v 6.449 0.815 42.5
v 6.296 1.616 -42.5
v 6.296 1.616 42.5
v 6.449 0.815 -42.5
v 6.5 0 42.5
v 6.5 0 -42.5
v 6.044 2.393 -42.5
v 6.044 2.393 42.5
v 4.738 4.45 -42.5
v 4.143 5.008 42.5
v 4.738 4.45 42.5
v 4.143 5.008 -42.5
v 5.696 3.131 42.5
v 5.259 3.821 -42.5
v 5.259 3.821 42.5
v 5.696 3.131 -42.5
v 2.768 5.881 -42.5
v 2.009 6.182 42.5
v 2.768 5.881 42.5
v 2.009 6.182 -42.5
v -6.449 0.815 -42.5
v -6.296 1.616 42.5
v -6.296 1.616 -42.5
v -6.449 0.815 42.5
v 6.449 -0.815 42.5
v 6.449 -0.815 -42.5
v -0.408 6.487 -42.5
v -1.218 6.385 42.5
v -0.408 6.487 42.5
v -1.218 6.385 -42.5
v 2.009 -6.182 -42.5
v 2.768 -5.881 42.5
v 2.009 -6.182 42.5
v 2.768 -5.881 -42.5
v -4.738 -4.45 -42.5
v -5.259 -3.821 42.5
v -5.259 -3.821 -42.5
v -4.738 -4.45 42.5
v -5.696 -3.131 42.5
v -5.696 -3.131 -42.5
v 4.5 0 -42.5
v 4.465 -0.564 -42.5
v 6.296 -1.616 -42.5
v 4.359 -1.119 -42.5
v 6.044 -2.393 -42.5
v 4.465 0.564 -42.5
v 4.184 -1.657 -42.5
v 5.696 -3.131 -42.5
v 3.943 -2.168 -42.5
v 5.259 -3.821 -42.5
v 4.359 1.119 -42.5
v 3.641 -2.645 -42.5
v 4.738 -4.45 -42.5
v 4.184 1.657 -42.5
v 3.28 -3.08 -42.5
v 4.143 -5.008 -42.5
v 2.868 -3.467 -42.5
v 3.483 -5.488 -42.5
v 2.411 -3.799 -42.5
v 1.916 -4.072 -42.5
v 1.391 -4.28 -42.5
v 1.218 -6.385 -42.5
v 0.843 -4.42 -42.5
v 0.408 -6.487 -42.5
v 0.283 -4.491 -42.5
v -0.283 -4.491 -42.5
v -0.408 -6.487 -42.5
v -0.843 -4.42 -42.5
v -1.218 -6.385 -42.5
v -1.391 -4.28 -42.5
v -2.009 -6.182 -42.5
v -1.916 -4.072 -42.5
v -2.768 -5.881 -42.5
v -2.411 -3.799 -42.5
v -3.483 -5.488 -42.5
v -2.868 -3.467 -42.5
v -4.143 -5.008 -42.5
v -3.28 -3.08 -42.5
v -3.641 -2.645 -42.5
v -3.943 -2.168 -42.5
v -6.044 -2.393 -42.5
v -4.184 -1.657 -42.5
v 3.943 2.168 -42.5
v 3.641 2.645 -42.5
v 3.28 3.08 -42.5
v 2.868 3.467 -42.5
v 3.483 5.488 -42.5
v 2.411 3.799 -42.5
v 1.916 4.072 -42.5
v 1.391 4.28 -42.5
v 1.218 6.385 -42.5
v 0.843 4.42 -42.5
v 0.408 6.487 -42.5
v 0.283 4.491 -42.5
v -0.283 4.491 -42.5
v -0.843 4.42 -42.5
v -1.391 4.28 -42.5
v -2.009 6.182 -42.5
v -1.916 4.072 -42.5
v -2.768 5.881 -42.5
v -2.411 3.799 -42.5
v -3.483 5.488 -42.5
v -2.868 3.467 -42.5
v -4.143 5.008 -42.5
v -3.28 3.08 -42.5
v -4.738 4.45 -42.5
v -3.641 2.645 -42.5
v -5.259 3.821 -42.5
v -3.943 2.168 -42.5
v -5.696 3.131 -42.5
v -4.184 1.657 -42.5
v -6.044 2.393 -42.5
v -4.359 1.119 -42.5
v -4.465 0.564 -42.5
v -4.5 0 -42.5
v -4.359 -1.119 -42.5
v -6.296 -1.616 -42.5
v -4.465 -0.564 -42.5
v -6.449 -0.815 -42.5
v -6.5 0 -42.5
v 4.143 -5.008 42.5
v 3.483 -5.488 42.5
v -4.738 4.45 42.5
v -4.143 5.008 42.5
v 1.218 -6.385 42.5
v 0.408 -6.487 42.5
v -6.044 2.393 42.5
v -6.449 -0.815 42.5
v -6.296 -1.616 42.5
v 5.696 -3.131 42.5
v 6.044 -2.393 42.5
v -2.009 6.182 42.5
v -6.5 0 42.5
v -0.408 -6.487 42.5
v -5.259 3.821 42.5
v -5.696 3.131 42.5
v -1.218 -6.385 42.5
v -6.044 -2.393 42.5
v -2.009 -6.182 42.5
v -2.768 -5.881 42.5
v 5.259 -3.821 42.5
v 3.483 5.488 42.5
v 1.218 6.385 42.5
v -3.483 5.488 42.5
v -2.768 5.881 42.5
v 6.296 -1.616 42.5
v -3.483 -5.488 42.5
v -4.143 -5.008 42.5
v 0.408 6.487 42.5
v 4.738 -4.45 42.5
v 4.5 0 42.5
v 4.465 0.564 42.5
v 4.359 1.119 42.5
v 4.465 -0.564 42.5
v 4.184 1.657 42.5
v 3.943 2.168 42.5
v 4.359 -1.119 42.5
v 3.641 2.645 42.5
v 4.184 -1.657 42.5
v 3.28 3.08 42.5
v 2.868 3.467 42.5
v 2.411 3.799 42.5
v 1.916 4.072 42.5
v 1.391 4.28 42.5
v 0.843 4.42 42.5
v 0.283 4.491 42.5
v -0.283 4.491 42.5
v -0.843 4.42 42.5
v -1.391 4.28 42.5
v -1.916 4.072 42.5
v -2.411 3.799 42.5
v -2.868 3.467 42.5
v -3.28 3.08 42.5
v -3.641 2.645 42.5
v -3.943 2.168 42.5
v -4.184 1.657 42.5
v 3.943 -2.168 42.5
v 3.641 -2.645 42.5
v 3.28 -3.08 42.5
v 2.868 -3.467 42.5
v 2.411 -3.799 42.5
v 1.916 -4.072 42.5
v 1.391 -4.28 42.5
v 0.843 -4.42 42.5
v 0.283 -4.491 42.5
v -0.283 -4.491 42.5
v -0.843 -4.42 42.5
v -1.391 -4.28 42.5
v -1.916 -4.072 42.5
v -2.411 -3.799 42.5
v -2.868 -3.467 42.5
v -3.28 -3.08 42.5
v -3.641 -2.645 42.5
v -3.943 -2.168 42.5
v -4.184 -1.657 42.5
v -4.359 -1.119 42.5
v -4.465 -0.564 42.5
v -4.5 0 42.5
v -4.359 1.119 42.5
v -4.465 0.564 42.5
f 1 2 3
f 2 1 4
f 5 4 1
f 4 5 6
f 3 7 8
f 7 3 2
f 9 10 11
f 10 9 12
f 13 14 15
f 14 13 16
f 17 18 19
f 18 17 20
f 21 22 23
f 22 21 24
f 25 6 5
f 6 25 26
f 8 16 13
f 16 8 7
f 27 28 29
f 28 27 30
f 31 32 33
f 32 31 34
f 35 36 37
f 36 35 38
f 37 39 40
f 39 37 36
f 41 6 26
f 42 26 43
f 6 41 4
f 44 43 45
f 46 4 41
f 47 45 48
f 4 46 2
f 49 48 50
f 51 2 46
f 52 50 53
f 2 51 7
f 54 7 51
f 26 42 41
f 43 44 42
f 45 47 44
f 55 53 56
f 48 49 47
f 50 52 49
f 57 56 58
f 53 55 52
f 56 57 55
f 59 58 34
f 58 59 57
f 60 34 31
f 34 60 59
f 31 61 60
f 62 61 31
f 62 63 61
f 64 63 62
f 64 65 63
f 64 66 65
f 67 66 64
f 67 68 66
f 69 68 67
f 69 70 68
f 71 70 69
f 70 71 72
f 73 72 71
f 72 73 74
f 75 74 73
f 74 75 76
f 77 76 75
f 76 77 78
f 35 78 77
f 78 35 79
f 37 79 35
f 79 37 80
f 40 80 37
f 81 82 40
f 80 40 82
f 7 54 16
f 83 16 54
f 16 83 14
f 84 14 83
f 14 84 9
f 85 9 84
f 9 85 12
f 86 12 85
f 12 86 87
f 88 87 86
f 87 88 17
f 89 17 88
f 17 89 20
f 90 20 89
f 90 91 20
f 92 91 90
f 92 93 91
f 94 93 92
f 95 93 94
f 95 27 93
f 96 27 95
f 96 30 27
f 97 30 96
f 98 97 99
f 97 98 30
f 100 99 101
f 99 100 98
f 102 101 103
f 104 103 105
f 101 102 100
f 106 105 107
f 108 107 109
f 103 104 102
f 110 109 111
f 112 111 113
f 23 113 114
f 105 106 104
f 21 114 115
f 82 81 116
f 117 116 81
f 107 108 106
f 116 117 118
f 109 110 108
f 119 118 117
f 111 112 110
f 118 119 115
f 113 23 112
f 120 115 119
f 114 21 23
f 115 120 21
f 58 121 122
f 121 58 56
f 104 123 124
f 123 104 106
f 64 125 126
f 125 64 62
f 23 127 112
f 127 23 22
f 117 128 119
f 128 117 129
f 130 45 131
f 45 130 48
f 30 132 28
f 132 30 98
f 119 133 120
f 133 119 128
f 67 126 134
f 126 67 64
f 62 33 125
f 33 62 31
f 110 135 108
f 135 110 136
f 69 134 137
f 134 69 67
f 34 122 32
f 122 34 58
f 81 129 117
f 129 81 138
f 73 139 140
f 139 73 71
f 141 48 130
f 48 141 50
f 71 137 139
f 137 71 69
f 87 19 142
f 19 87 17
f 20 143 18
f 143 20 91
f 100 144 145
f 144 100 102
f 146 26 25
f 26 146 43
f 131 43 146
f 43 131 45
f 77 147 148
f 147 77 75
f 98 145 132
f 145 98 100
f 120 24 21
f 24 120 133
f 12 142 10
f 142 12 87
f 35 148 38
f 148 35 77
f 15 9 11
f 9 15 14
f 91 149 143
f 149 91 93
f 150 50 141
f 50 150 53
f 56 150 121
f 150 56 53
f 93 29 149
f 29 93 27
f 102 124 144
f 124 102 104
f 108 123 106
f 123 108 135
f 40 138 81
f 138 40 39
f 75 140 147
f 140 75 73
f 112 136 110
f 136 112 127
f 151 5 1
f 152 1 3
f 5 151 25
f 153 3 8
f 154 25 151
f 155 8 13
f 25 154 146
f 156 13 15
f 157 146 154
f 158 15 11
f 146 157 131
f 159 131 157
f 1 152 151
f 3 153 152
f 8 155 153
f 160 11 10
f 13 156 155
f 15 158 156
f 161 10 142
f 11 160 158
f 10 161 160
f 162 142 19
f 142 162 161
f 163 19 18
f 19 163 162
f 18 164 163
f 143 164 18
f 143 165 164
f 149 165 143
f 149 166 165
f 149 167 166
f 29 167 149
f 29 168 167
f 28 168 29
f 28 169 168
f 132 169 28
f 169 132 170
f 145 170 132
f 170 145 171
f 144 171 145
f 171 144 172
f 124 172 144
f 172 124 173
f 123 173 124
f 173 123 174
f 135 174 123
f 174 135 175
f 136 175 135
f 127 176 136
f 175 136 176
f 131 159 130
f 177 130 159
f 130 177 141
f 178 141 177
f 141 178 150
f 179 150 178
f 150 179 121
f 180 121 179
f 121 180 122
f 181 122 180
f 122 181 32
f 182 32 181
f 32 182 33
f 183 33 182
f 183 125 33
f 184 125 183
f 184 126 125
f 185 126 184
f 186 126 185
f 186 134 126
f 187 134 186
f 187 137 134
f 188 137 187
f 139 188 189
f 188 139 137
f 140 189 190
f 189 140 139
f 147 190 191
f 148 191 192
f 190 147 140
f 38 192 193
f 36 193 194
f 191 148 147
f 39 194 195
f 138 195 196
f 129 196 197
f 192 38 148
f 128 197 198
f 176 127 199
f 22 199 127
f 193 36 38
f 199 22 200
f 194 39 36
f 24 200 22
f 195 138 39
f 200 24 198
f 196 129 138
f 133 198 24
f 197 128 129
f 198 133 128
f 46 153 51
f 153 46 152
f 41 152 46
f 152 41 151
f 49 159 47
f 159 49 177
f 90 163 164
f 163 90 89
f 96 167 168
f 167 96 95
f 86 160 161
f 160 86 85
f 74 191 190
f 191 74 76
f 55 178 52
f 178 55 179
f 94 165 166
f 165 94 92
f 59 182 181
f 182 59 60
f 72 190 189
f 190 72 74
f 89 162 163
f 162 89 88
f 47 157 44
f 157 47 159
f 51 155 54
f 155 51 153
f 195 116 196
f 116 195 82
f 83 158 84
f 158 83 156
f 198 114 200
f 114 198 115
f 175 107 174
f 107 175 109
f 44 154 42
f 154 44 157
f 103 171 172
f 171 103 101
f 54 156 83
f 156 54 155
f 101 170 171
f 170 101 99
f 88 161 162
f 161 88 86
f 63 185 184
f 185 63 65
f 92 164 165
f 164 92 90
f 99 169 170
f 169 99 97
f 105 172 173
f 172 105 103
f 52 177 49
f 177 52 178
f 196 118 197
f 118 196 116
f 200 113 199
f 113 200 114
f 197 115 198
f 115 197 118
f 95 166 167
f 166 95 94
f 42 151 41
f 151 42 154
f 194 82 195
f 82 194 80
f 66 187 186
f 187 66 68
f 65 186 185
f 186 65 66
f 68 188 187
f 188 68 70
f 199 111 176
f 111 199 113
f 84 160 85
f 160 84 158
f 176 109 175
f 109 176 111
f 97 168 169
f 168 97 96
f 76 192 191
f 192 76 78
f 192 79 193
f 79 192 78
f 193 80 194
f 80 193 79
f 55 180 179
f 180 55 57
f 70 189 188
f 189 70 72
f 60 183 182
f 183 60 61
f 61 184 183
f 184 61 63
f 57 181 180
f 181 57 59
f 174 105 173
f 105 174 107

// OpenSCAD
$fn = 50;


difference() {
	union() {
		translate(v = [0, 0, -42.5000000000]) {
			cylinder(h = 85, r = 6.5000000000);
		}
	}
	union() {
		translate(v = [0, 0, -100.0000000000]) {
			cylinder(h = 200, r = 4.5000000000);
		}
	}
}
